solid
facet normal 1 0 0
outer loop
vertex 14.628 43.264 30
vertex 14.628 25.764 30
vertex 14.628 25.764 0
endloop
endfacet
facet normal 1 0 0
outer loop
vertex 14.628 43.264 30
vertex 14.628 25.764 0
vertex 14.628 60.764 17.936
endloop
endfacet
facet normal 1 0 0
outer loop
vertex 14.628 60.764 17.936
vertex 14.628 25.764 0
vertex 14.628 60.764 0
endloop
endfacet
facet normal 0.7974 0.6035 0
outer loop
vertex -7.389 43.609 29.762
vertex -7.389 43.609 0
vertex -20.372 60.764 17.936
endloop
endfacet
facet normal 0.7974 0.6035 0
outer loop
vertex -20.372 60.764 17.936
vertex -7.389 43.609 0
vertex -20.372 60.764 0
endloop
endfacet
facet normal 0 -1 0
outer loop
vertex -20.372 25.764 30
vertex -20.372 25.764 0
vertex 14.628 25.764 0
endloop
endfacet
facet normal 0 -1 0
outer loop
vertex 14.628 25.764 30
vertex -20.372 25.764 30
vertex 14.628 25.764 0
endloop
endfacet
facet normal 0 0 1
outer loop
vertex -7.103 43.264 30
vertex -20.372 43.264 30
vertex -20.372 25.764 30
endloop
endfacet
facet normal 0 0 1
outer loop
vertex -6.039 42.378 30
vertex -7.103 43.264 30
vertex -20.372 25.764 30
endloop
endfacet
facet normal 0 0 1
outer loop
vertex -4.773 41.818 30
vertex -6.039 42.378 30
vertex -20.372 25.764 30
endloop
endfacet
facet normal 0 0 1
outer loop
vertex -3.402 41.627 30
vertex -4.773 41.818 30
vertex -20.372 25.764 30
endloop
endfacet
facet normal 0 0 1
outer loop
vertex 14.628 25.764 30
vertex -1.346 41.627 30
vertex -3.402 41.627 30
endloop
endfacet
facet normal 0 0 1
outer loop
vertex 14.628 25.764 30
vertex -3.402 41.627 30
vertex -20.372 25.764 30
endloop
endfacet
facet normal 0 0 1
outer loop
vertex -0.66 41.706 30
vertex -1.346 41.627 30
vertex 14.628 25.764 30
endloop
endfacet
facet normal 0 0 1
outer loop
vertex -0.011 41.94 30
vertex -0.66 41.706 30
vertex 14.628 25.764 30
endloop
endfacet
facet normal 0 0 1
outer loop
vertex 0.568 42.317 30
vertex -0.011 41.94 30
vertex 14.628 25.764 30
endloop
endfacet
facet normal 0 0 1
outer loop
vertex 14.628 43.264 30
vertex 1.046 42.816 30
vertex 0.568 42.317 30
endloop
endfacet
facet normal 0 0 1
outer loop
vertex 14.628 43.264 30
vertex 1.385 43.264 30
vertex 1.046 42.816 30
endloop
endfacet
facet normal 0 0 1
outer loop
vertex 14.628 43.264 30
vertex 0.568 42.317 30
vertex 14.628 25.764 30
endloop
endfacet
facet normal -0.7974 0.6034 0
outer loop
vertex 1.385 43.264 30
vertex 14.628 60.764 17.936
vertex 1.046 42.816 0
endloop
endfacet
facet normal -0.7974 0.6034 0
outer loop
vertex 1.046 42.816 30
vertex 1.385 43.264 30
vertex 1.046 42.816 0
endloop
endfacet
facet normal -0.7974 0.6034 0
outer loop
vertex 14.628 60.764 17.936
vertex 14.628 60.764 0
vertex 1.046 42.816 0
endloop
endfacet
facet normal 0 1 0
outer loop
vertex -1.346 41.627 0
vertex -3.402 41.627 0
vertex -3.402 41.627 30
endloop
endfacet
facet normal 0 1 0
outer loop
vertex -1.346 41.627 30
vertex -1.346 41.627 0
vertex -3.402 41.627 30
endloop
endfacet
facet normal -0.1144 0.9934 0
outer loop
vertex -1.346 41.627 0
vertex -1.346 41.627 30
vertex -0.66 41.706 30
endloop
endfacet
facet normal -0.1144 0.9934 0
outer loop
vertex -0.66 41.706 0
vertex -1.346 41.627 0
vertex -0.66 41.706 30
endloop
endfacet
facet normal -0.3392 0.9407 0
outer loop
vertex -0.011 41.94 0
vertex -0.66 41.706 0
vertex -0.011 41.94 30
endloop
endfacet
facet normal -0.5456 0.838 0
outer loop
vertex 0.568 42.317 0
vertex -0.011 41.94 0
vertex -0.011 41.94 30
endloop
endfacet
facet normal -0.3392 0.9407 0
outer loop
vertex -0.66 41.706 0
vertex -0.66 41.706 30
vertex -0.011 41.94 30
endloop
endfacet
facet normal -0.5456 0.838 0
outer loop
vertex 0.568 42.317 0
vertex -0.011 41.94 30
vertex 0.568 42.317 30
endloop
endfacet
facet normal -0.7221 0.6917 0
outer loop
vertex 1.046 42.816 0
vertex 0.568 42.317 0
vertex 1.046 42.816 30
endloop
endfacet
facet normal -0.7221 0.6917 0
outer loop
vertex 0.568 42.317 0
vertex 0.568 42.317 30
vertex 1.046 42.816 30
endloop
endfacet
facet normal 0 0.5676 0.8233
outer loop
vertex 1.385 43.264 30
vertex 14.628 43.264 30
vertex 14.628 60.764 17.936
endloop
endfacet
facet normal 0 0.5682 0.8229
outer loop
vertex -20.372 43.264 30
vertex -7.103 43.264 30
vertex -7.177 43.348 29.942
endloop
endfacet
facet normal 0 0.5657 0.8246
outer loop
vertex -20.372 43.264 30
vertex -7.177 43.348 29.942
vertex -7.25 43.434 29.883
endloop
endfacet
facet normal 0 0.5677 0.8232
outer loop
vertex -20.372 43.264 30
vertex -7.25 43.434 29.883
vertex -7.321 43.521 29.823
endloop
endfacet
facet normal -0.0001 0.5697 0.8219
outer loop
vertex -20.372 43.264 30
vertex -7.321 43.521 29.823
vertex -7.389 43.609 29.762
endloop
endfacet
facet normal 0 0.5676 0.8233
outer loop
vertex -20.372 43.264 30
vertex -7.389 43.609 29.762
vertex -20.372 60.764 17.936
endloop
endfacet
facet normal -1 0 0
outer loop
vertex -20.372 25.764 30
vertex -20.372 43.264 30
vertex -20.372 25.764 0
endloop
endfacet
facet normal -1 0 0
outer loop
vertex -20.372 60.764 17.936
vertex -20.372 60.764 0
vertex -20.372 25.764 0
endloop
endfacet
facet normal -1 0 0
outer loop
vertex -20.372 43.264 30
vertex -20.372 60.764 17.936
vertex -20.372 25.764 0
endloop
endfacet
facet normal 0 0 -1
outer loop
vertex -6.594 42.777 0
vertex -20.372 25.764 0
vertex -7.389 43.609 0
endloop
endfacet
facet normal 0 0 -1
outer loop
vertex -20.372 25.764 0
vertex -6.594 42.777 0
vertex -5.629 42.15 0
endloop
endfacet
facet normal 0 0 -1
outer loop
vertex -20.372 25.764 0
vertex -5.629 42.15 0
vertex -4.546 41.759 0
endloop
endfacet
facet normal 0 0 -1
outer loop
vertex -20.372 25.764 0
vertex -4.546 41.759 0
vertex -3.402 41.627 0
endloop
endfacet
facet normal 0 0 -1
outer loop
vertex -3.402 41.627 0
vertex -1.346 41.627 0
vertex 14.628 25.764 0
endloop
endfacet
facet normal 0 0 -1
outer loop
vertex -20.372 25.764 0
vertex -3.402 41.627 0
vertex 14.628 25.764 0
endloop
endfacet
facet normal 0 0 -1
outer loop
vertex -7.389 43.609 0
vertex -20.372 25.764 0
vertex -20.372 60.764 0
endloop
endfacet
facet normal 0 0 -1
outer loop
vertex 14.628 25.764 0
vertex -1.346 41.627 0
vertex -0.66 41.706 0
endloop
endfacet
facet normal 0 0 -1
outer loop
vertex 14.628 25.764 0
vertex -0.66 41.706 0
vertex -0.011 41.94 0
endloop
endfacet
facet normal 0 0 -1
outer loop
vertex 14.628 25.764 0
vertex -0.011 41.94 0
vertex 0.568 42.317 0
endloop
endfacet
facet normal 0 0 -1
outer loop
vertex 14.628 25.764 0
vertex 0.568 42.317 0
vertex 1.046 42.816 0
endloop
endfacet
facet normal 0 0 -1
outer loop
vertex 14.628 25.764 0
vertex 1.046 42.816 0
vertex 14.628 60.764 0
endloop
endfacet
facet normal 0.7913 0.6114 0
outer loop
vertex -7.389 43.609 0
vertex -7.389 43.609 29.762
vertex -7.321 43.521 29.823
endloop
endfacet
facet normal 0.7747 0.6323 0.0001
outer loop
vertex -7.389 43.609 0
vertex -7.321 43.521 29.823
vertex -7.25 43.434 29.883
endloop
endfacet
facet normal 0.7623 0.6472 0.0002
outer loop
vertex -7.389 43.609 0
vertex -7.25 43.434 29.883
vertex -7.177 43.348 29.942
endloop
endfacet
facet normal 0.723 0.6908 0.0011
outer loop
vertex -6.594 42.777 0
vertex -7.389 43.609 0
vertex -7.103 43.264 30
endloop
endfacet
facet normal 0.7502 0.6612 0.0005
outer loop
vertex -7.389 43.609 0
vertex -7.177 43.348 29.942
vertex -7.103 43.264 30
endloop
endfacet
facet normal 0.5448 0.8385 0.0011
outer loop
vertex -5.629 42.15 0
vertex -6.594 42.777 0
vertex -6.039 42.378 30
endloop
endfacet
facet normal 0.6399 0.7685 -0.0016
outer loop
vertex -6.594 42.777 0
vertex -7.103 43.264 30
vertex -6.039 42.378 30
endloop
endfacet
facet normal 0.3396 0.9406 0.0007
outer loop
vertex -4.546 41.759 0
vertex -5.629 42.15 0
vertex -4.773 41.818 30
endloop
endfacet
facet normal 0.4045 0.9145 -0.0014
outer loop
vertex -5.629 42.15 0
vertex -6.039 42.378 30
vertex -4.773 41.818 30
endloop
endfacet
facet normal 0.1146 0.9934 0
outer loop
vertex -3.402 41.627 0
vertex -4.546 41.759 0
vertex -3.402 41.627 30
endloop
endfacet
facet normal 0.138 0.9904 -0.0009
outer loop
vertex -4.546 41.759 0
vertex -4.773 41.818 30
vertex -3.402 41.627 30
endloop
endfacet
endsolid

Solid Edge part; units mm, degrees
sketch "Sketch1" plane through (0, 0, 0) normal (0, 0, 1) x (1, 0, 0)
  line L0 (14.6283, 60.7642) -> (-2.8717, 37.6396)
  line L1 (-2.8717, 37.6396) -> (-20.3717, 60.7642)
  line L2 (-20.3717, 60.7642) -> (-20.3717, 25.7642)
  line L3 (-20.3717, 25.7642) -> (14.6283, 25.7642)
  line L4 (14.6283, 25.7642) -> (14.6283, 60.7642)
extrude "Protrusion1" add sketch "Sketch1" along normal blind 30
chamfer "Chamfer_1" distance 5 angle 45 1 edges at (-2.8717, 37.6396, 15)
sketch "Sketch2" plane through (14.6283, 43.2642, 15) normal (1, 0, 0) x (0, 0, -1)
  line L0 (-15, 0) -> (-15, 17.5)
  line L1 (-15, 17.5) -> (-2.9359, 17.5)
  line L2 (-15, 0) -> (-2.9359, 17.5)
extrude "ExtrudedCutout_1" cut sketch "Sketch2" against normal blind 45
fillet "Round_2" radius 5 1 edges at (-5.8889, 41.6266, 15)
fillet "Round_3" radius 3 1 edges at (0.1455, 41.6266, 15)
properties material "Chocolate"
